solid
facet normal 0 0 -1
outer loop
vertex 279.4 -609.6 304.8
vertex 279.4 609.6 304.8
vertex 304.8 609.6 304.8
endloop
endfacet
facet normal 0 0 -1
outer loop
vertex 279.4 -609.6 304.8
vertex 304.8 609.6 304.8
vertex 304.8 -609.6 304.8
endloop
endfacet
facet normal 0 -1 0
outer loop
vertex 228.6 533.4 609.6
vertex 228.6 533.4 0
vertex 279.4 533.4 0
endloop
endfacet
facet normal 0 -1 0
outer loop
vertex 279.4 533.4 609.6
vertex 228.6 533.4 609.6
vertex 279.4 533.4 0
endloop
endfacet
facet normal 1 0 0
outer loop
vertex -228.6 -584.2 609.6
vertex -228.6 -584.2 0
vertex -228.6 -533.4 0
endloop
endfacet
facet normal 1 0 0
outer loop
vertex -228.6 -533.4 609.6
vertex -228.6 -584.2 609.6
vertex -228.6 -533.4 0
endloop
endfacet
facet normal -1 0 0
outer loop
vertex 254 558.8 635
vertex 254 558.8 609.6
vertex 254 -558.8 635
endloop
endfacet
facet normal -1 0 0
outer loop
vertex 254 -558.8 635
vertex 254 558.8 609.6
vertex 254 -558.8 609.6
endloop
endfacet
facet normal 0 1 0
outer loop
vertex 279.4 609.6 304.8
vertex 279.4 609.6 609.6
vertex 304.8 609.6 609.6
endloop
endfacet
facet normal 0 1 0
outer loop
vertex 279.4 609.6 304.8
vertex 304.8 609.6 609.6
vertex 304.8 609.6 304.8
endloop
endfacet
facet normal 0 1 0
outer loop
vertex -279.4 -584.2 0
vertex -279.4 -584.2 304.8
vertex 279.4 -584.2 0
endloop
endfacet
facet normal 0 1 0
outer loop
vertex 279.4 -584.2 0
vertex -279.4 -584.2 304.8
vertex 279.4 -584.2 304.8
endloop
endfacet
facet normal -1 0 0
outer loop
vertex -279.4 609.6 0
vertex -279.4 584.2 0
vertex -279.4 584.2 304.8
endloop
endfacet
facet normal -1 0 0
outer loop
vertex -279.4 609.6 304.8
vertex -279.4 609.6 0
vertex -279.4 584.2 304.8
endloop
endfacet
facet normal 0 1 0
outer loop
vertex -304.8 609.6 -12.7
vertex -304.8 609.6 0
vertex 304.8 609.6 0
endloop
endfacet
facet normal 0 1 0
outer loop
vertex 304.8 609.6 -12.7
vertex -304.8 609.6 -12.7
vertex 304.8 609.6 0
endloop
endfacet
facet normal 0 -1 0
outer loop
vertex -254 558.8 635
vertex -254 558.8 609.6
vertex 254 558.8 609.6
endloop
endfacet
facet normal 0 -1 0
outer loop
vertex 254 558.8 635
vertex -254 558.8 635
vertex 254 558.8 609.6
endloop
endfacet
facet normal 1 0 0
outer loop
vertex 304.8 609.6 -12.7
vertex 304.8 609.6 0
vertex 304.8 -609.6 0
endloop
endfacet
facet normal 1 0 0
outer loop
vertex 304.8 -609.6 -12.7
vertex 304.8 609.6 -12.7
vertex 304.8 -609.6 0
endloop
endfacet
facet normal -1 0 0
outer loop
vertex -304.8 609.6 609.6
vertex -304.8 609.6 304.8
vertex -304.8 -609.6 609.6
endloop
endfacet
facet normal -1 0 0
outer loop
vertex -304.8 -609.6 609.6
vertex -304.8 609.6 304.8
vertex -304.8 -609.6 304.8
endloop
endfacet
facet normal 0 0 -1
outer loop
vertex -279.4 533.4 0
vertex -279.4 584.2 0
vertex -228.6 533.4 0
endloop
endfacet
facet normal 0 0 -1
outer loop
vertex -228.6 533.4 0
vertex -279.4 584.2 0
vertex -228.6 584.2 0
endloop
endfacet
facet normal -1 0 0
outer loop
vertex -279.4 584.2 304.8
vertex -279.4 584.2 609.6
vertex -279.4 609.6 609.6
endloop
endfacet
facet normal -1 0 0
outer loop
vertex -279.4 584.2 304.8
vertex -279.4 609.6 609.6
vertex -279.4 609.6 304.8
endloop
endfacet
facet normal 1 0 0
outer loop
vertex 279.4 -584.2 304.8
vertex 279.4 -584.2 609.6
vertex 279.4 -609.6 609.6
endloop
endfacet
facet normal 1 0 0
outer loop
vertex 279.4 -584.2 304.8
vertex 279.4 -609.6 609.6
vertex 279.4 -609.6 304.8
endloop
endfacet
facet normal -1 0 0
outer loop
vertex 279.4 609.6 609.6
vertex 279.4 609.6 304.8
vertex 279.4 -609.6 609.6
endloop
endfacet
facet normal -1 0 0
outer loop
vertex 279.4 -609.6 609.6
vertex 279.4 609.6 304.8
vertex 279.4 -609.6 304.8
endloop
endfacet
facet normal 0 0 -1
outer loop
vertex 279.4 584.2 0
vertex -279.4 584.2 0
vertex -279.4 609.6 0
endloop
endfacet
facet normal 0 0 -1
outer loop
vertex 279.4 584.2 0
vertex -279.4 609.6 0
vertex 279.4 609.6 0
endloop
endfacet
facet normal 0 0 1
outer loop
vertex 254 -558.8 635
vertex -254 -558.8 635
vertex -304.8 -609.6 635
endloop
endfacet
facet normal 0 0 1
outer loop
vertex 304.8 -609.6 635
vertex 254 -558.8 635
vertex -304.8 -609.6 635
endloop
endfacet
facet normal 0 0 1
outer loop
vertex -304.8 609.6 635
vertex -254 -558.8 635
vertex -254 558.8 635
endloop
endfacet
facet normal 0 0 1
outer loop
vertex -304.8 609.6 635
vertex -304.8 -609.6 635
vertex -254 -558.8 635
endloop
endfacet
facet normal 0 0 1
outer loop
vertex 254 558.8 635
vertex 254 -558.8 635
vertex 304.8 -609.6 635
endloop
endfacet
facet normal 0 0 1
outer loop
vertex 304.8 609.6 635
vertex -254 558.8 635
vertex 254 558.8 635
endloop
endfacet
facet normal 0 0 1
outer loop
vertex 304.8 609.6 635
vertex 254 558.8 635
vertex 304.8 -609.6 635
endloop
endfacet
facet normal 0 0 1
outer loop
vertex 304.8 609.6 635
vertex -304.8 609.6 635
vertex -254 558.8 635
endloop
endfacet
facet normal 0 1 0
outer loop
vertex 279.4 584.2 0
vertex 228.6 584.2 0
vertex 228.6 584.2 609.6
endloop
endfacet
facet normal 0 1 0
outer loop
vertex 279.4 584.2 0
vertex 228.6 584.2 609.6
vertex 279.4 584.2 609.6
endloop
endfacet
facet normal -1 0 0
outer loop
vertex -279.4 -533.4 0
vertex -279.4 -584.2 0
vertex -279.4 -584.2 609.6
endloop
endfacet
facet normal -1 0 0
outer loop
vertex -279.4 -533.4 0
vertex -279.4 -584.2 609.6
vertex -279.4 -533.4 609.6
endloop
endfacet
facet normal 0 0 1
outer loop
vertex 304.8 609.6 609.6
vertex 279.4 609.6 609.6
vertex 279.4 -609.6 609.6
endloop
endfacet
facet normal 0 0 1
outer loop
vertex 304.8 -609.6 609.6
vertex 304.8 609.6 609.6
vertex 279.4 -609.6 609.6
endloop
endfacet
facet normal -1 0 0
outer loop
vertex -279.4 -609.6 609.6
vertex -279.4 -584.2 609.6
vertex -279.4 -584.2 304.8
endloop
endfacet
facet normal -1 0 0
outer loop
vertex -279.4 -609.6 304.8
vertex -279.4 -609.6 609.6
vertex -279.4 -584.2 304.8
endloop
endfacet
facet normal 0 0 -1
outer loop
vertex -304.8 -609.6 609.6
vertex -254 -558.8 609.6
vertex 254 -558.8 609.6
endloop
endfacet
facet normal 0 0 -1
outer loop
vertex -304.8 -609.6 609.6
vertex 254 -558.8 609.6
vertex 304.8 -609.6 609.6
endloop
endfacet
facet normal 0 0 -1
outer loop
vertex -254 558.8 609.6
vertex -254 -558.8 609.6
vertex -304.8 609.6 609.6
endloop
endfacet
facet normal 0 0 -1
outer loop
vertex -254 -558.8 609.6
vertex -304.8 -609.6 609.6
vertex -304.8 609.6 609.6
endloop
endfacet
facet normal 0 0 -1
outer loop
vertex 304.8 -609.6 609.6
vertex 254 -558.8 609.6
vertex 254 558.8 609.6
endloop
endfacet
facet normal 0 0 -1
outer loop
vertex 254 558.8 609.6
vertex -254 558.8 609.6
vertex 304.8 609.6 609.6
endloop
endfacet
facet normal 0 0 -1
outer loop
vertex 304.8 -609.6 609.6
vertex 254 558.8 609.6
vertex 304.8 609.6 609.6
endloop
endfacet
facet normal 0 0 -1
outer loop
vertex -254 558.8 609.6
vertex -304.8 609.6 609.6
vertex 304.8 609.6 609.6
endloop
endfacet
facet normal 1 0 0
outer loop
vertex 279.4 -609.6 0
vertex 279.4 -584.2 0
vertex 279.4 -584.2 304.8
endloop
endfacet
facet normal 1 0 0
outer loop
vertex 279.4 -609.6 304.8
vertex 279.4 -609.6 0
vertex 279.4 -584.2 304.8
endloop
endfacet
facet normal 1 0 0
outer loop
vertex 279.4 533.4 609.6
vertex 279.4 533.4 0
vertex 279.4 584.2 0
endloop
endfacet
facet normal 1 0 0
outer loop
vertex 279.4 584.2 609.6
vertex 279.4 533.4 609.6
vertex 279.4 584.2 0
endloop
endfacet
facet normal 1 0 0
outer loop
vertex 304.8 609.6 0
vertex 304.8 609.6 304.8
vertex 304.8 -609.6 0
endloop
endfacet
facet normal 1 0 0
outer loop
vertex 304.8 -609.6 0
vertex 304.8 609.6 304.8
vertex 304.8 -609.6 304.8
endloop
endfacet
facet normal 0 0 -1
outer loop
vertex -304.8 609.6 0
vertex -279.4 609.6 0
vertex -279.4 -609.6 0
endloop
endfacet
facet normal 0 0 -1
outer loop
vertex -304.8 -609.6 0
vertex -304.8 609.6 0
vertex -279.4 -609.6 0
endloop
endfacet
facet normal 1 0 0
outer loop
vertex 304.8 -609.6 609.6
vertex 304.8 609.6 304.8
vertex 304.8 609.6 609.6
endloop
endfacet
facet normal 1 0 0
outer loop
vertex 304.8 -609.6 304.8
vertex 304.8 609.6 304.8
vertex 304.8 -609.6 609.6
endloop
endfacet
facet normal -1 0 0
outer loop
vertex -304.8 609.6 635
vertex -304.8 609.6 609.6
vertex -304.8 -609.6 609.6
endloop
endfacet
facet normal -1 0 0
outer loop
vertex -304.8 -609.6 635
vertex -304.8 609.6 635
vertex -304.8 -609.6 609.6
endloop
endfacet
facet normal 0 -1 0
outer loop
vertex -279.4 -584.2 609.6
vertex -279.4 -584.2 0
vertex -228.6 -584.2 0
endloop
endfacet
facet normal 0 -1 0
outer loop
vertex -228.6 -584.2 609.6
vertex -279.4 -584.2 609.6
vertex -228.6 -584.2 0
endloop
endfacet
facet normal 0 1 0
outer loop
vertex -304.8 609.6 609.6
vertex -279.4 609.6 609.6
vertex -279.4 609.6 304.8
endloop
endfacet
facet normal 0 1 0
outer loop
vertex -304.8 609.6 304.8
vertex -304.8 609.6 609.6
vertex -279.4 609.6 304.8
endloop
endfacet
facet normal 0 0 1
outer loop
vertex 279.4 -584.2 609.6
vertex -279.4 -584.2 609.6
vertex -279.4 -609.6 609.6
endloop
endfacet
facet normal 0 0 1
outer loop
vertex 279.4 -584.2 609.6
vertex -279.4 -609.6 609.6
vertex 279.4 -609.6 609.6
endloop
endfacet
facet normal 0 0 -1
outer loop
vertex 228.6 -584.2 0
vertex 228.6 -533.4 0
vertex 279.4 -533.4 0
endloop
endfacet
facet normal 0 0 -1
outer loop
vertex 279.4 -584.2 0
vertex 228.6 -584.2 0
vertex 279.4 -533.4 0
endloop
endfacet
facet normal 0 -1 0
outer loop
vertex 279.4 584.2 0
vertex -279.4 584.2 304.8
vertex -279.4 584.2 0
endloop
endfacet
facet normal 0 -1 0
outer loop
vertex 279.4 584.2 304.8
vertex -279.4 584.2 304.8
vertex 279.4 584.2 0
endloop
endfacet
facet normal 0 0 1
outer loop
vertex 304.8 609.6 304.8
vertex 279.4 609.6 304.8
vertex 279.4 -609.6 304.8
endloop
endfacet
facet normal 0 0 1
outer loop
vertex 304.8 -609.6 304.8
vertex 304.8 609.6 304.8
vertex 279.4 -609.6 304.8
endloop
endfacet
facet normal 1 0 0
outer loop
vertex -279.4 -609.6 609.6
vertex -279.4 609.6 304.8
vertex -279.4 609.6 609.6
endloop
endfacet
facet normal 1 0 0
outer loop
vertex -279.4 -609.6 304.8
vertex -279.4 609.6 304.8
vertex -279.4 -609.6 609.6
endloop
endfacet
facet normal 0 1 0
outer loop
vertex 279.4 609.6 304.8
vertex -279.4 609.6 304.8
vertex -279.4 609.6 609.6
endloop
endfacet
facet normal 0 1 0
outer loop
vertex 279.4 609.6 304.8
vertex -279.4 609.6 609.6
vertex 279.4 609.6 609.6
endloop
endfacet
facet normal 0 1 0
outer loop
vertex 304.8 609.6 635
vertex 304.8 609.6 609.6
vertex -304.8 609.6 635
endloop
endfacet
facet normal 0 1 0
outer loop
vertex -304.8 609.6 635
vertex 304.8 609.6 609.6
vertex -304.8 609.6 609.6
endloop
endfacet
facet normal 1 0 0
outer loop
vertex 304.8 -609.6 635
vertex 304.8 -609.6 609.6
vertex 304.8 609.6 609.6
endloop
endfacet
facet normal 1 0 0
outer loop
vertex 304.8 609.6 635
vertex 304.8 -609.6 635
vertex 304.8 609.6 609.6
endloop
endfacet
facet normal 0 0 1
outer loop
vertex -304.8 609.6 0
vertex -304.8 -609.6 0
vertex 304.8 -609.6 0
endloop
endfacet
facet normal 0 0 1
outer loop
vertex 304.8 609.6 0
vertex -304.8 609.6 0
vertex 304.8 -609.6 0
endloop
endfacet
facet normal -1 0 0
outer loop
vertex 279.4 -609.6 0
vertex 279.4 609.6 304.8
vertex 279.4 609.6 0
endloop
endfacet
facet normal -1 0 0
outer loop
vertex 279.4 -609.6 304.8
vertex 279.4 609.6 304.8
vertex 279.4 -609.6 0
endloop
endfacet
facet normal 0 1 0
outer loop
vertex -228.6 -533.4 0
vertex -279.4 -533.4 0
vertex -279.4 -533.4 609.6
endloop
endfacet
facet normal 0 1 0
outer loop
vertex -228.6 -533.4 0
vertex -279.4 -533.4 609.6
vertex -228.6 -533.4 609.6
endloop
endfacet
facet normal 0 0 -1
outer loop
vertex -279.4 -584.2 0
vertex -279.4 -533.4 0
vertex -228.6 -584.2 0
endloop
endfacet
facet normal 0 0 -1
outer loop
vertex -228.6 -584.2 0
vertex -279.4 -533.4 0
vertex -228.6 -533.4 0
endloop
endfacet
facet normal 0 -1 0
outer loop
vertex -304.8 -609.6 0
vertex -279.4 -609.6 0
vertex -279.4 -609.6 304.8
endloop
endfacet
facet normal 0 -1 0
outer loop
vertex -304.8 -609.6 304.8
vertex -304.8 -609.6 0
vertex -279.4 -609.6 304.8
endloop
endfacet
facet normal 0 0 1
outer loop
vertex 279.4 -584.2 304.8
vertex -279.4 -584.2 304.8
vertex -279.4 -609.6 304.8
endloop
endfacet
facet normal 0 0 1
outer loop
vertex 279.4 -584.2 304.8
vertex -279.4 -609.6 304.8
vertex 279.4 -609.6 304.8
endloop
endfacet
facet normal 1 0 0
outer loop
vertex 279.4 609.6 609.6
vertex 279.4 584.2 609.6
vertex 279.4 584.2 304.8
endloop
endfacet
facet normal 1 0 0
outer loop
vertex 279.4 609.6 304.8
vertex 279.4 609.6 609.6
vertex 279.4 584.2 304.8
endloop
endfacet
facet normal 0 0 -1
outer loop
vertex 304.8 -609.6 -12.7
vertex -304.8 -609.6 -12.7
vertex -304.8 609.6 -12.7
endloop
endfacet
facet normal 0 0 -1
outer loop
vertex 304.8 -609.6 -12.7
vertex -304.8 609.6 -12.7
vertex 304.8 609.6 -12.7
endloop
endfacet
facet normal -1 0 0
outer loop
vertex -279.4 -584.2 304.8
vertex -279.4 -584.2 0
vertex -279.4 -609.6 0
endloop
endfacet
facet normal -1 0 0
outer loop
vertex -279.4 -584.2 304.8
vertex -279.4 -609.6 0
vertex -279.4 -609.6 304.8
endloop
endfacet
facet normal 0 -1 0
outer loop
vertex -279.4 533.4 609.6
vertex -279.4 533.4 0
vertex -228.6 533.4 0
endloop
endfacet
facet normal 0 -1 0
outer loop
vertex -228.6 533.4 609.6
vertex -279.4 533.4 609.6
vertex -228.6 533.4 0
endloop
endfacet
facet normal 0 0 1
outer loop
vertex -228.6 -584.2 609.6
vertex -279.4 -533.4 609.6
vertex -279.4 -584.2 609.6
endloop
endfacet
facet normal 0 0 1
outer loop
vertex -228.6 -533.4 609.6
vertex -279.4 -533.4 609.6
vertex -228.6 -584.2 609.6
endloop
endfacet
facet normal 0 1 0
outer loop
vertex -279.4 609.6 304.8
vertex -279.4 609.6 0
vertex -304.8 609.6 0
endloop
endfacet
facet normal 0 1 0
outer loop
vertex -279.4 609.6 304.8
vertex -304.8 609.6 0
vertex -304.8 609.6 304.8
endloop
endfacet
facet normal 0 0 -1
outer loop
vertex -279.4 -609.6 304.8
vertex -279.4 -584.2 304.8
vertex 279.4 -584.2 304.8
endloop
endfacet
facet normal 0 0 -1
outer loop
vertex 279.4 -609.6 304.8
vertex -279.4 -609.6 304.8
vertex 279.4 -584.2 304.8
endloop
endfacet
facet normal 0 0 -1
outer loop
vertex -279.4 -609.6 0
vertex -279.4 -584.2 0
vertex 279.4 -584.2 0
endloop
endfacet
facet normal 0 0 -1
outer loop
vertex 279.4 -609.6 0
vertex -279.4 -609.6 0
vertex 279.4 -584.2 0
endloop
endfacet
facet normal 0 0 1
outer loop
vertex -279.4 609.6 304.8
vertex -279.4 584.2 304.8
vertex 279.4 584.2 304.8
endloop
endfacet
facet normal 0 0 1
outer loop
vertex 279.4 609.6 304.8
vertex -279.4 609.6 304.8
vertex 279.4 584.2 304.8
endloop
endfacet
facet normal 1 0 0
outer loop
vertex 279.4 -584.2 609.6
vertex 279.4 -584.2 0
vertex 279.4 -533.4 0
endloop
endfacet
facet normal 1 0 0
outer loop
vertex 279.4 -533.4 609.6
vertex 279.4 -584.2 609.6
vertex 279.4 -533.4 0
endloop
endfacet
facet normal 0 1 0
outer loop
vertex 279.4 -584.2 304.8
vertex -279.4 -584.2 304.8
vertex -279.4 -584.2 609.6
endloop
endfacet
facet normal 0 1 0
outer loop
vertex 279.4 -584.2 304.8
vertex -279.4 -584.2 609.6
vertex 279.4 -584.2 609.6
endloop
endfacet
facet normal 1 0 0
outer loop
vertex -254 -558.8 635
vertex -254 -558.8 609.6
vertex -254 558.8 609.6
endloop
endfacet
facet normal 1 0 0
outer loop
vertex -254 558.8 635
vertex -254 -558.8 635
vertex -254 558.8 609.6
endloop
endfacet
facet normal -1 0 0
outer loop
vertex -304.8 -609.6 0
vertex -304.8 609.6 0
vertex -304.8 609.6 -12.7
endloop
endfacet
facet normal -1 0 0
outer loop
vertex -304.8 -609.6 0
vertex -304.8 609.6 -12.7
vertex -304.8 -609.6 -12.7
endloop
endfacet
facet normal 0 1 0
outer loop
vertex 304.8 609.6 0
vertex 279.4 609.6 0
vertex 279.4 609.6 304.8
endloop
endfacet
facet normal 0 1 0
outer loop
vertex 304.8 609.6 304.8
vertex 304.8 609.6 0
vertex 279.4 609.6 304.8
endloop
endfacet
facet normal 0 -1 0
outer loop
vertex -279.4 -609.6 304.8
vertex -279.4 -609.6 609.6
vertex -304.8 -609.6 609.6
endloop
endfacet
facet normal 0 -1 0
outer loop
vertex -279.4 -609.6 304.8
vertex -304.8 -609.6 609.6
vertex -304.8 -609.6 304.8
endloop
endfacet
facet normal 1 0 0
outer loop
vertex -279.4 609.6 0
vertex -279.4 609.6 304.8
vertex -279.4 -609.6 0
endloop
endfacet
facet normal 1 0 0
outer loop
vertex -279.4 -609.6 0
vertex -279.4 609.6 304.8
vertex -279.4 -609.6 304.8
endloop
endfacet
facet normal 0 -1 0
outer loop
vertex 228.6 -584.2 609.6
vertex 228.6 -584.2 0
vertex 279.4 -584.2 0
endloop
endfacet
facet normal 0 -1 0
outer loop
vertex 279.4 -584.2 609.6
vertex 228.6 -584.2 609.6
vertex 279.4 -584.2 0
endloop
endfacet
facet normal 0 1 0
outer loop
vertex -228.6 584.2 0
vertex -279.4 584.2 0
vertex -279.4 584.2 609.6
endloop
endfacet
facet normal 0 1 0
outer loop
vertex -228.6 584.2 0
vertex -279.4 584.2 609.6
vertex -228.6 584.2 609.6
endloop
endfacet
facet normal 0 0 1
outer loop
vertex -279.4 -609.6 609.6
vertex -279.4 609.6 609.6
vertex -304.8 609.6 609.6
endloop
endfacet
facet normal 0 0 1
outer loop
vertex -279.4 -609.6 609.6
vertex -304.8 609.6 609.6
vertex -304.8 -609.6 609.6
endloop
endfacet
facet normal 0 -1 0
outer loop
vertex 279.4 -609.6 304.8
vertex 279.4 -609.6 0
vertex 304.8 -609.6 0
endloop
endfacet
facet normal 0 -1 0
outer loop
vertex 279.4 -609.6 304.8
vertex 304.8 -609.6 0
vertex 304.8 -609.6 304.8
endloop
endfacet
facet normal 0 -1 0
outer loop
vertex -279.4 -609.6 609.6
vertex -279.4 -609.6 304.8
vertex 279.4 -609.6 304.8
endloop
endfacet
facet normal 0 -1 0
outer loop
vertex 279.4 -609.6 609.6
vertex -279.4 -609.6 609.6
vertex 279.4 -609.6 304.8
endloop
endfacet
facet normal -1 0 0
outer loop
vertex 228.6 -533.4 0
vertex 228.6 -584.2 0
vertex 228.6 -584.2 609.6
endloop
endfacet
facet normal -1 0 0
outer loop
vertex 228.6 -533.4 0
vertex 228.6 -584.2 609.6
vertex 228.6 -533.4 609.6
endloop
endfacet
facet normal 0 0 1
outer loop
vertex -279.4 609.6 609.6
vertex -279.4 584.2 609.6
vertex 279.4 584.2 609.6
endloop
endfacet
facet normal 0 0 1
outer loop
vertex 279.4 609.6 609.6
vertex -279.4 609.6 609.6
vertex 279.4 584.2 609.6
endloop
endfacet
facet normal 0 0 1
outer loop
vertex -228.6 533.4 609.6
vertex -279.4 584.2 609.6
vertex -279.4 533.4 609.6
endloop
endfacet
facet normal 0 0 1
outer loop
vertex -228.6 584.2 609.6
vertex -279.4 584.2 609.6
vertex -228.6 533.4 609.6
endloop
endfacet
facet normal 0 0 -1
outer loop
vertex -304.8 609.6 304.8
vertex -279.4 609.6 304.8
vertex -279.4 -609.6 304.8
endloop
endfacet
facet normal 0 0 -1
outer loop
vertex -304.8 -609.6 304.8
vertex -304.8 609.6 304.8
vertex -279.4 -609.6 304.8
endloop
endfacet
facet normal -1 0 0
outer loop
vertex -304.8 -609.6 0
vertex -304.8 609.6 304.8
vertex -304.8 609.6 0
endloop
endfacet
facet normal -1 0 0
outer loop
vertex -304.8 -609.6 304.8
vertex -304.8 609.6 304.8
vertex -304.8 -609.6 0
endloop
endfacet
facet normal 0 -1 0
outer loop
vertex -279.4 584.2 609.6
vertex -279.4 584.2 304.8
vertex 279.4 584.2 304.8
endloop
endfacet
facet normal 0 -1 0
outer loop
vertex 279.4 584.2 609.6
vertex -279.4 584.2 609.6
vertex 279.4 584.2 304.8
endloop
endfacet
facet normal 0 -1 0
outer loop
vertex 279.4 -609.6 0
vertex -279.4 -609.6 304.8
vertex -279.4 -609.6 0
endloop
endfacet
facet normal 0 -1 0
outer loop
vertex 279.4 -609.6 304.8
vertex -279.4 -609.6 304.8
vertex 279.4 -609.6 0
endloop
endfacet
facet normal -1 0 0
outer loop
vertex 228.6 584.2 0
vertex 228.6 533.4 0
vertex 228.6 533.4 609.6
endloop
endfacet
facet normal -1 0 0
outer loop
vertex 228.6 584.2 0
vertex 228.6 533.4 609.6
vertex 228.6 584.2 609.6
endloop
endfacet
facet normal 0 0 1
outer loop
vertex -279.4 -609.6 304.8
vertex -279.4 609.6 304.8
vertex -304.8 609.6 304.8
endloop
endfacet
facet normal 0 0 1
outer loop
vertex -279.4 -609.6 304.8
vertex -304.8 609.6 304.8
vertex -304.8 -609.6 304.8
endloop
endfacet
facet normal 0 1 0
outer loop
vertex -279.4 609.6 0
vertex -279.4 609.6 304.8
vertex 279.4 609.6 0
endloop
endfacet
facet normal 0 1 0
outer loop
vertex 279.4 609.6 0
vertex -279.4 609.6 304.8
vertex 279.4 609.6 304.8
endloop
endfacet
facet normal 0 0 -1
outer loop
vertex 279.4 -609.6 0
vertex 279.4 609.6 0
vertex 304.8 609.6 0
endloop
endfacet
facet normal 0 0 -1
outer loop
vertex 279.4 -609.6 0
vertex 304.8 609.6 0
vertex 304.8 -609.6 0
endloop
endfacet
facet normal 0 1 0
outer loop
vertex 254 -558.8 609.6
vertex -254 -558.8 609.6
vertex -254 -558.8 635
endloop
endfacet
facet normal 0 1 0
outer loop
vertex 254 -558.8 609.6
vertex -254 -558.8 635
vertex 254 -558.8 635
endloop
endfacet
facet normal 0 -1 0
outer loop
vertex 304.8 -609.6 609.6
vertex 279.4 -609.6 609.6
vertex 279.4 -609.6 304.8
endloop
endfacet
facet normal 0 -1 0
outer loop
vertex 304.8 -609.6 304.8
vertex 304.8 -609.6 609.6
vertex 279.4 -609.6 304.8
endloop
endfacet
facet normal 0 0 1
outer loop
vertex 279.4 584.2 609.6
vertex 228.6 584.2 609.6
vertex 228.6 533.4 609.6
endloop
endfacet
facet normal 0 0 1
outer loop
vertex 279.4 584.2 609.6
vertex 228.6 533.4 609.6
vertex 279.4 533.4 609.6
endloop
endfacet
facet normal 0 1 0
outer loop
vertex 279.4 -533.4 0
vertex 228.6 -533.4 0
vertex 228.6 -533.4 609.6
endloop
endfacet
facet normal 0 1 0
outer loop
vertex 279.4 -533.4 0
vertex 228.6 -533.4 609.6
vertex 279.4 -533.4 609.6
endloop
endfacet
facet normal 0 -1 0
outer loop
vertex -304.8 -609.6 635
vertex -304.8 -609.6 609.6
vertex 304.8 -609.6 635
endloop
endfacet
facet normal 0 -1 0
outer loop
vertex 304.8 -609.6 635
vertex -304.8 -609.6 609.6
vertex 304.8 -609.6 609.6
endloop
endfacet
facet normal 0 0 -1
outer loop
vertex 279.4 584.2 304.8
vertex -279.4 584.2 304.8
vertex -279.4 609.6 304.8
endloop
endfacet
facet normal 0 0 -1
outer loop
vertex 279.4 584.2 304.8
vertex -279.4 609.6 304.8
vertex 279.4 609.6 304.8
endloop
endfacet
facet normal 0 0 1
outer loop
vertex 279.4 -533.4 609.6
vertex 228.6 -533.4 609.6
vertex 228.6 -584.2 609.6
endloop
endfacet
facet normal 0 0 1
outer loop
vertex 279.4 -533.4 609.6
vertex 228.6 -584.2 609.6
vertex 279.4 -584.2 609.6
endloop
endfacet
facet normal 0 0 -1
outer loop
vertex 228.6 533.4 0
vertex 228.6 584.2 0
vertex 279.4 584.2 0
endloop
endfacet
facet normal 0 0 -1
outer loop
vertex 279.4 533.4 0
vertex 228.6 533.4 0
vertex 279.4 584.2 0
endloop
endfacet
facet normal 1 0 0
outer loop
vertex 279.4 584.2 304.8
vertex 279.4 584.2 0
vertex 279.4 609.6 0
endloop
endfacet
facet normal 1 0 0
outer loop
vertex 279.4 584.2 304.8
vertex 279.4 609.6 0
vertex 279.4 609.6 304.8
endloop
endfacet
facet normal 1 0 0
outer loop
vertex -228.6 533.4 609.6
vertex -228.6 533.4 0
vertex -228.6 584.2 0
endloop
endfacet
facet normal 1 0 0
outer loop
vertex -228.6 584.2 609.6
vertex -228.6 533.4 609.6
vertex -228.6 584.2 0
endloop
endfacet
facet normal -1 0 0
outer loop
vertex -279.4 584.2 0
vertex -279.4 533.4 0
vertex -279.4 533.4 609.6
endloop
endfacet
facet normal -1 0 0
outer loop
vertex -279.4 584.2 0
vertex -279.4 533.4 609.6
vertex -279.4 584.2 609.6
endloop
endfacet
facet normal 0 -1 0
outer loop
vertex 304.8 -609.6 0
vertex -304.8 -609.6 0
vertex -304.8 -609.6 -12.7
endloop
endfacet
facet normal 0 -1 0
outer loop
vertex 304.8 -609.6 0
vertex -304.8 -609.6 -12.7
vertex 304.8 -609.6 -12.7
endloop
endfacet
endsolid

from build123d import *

# Parameters (mm, degrees)
F0_W      = 50.8
F0_H      = 50.8
F1_DEPTH  = 609.6
F2_W      = 558.8
F2_H      = 304.8
F3_DEPTH  = 25.4
F6_W      = 1219.2
F6_H      = 304.8
F7_DEPTH  = 25.4
F10_W     = 609.6
F10_H     = 1219.2
F11_DEPTH = 12.7
F13_W     = 508
F13_H     = 50.8
F14_DEPTH = 25.4


with BuildPart() as f1:
    # F0 (on Top) → F1 (new body)
    with BuildSketch(Plane.XY):
        with Locations((254, -558.8)):
            Rectangle(F0_W, F0_H)
        with Locations((-254, -558.8)):
            Rectangle(F0_W, F0_H)
        with Locations((-254, 558.8)):
            Rectangle(F0_W, F0_H)
        with Locations((254, 558.8)):
            Rectangle(F0_W, F0_H)
    extrude(amount=F1_DEPTH)


with BuildPart() as f3:
    # F2 (on face) → F3 (new body)
    with BuildSketch(Plane.XZ.offset(584.2)):
        with Locations((0, 152.4)):
            Rectangle(F2_W, F2_H)
    extrude(amount=F3_DEPTH)


with BuildPart() as f4_1:
    # F4: instance of F3
    add(f3.part.mirror(Plane(origin=(0, -596.9, 304.8), x_dir=(1, 0, 0), z_dir=(0, 0, 1))))


with BuildPart() as f5_1:
    # F5: instance of F4_1
    add(f4_1.part.mirror(Plane.XZ))


with BuildPart() as f5_2:
    # F5: instance of F3
    add(f3.part.mirror(Plane.XZ))


with BuildPart() as f7:
    # F6 (on face) → F7 (new body)
    with BuildSketch(Plane(origin=(-279.4, 0, 0), x_dir=(0, -1, 0), z_dir=(-1, 0, 0))):
        with Locations((0, 152.4)):
            Rectangle(F6_W, F6_H)
    extrude(amount=F7_DEPTH)


with BuildPart() as f8_1:
    # F8: instance of F7
    add(f7.part.mirror(Plane(origin=(-292.1, 0, 304.8), x_dir=(1, 0, 0), z_dir=(0, 0, 1))))


with BuildPart() as f9_1:
    # F9: instance of F7
    add(f7.part.mirror(Plane.YZ))


with BuildPart() as f9_2:
    # F9: instance of F8_1
    add(f8_1.part.mirror(Plane.YZ))


with BuildPart() as f11:
    # F10 (on face) → F11 (new body)
    with BuildSketch(Plane(origin=(0, 0, 0), x_dir=(1, 0, 0), z_dir=(0, 0, -1))):
        Rectangle(F10_W, F10_H)
    extrude(amount=F11_DEPTH)


with BuildPart() as f14:
    # F13 (on face) → F14 (new body)
    with BuildSketch(Plane.XY.offset(609.6)):
        Polygon((-304.8, 609.6), (-304.8, -609.6), (-254, -609.6), (-254, -558.8), (-254, 558.8), (-254, 609.6), align=None)
        with Locations((0, -584.2)):
            Rectangle(F13_W, F13_H)
        Polygon((254, -558.8), (254, -609.6), (304.8, -609.6), (304.8, 609.6), (254, 609.6), (254, 558.8), align=None)
        with Locations((0, 584.2)):
            Rectangle(F13_W, F13_H)
    extrude(amount=F14_DEPTH)


solid = Compound([f1.part, f3.part, f4_1.part, f5_1.part, f5_2.part, f7.part, f8_1.part, f9_1.part, f9_2.part, f11.part, f14.part])
